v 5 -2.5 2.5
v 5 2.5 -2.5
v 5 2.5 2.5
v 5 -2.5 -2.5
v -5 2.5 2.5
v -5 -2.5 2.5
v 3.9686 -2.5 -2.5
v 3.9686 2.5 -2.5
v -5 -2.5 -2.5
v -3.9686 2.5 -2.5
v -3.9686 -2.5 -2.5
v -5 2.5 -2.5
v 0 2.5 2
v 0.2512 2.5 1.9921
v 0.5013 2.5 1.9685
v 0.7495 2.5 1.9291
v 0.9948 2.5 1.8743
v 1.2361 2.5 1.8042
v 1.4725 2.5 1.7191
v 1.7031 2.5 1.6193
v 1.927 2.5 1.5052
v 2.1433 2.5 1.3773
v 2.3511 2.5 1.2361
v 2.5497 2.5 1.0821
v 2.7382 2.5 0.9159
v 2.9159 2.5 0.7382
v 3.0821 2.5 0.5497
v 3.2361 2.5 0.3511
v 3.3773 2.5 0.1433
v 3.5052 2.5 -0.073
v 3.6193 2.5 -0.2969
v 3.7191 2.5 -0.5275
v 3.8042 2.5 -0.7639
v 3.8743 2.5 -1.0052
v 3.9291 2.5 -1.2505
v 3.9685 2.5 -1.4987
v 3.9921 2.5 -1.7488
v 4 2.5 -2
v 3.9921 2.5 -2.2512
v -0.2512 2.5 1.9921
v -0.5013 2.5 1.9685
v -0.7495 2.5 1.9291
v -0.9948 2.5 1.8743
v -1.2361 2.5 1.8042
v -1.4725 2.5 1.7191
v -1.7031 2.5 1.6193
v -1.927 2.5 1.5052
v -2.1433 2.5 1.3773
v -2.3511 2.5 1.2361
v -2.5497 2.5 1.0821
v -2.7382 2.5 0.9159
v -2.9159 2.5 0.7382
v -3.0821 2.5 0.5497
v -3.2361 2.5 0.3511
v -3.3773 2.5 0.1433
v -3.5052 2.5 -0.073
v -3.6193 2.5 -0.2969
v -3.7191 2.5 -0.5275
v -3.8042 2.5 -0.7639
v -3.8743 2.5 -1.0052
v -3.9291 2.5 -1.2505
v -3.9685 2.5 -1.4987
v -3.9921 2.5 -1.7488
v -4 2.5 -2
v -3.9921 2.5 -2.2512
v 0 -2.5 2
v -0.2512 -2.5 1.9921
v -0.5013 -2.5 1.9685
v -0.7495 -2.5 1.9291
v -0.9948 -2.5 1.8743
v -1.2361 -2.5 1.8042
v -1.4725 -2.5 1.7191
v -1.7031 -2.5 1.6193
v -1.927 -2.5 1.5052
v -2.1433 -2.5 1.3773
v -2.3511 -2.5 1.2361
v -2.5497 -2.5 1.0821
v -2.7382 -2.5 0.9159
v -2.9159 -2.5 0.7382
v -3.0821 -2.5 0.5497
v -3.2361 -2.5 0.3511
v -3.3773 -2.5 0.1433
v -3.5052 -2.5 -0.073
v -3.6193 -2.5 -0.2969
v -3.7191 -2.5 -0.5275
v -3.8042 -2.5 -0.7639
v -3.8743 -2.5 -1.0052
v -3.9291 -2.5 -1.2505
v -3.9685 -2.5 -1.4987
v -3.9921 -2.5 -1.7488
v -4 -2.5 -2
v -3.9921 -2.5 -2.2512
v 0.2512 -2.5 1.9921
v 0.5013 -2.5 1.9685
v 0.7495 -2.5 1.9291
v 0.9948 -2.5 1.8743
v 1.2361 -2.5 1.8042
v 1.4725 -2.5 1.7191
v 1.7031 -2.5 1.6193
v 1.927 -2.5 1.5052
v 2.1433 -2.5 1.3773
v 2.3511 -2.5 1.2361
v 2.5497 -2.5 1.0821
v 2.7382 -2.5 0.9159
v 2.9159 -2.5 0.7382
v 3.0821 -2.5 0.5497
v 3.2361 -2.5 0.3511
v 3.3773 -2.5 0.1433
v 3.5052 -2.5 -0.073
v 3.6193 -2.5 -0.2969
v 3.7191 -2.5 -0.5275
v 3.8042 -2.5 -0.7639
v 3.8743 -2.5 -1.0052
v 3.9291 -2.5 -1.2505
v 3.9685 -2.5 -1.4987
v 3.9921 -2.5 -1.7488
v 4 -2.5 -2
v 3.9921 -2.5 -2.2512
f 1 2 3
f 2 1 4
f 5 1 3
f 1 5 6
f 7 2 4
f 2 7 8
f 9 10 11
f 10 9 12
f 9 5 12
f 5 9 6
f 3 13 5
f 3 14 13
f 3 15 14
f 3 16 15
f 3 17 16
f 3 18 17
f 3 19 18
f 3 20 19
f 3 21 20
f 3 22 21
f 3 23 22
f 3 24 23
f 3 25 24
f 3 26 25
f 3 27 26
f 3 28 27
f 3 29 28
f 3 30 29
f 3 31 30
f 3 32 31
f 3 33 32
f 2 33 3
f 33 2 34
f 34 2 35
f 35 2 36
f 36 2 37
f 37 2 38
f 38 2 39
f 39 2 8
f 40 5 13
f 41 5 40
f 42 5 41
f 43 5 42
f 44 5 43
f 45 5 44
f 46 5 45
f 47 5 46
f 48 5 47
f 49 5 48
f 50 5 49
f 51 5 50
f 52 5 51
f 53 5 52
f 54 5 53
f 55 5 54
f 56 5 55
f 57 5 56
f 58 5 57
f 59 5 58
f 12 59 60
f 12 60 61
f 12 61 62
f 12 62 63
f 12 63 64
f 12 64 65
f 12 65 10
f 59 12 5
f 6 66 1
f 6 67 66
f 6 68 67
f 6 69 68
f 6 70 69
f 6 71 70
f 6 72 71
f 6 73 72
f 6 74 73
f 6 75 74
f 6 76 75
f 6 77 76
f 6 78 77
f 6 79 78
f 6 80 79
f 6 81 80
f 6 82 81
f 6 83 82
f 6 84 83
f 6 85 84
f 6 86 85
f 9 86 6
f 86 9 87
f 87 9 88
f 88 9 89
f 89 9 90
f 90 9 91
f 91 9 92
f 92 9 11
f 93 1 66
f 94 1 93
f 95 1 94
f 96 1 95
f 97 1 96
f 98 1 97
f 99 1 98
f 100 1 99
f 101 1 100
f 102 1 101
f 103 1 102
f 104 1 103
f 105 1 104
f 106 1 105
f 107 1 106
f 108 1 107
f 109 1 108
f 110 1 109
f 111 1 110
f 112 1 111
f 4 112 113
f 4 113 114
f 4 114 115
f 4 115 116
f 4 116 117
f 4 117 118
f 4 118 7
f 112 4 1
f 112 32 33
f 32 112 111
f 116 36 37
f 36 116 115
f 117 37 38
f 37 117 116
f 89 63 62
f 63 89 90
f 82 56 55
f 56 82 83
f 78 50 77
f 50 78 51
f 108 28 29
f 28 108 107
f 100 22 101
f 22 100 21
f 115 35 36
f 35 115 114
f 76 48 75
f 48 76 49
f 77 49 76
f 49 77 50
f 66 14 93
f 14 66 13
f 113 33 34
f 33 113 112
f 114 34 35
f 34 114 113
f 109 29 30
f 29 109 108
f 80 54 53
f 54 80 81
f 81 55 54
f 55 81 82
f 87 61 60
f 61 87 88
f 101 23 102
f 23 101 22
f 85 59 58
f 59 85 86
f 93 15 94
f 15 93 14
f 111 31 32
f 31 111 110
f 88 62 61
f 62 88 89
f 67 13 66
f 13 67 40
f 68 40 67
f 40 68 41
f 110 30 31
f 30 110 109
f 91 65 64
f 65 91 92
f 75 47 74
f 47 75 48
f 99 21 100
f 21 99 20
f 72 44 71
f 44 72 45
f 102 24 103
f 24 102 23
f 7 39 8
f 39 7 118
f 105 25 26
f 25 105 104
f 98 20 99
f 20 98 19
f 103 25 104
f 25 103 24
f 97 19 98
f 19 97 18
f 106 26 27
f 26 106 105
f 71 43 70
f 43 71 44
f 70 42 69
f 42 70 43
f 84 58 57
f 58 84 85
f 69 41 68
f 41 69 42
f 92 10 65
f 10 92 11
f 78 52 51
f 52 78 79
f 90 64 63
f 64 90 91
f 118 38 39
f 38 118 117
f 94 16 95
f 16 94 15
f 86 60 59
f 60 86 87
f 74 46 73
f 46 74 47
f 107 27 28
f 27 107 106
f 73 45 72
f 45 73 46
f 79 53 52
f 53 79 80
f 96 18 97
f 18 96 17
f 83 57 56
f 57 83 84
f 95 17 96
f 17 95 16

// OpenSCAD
$fn = 100;
difference() {
    cube([10,5,5], center=true);
    rotate([90,0,0]) translate([0,-2.00,0]) cylinder(10,4.00,4.00, center=true);
}
